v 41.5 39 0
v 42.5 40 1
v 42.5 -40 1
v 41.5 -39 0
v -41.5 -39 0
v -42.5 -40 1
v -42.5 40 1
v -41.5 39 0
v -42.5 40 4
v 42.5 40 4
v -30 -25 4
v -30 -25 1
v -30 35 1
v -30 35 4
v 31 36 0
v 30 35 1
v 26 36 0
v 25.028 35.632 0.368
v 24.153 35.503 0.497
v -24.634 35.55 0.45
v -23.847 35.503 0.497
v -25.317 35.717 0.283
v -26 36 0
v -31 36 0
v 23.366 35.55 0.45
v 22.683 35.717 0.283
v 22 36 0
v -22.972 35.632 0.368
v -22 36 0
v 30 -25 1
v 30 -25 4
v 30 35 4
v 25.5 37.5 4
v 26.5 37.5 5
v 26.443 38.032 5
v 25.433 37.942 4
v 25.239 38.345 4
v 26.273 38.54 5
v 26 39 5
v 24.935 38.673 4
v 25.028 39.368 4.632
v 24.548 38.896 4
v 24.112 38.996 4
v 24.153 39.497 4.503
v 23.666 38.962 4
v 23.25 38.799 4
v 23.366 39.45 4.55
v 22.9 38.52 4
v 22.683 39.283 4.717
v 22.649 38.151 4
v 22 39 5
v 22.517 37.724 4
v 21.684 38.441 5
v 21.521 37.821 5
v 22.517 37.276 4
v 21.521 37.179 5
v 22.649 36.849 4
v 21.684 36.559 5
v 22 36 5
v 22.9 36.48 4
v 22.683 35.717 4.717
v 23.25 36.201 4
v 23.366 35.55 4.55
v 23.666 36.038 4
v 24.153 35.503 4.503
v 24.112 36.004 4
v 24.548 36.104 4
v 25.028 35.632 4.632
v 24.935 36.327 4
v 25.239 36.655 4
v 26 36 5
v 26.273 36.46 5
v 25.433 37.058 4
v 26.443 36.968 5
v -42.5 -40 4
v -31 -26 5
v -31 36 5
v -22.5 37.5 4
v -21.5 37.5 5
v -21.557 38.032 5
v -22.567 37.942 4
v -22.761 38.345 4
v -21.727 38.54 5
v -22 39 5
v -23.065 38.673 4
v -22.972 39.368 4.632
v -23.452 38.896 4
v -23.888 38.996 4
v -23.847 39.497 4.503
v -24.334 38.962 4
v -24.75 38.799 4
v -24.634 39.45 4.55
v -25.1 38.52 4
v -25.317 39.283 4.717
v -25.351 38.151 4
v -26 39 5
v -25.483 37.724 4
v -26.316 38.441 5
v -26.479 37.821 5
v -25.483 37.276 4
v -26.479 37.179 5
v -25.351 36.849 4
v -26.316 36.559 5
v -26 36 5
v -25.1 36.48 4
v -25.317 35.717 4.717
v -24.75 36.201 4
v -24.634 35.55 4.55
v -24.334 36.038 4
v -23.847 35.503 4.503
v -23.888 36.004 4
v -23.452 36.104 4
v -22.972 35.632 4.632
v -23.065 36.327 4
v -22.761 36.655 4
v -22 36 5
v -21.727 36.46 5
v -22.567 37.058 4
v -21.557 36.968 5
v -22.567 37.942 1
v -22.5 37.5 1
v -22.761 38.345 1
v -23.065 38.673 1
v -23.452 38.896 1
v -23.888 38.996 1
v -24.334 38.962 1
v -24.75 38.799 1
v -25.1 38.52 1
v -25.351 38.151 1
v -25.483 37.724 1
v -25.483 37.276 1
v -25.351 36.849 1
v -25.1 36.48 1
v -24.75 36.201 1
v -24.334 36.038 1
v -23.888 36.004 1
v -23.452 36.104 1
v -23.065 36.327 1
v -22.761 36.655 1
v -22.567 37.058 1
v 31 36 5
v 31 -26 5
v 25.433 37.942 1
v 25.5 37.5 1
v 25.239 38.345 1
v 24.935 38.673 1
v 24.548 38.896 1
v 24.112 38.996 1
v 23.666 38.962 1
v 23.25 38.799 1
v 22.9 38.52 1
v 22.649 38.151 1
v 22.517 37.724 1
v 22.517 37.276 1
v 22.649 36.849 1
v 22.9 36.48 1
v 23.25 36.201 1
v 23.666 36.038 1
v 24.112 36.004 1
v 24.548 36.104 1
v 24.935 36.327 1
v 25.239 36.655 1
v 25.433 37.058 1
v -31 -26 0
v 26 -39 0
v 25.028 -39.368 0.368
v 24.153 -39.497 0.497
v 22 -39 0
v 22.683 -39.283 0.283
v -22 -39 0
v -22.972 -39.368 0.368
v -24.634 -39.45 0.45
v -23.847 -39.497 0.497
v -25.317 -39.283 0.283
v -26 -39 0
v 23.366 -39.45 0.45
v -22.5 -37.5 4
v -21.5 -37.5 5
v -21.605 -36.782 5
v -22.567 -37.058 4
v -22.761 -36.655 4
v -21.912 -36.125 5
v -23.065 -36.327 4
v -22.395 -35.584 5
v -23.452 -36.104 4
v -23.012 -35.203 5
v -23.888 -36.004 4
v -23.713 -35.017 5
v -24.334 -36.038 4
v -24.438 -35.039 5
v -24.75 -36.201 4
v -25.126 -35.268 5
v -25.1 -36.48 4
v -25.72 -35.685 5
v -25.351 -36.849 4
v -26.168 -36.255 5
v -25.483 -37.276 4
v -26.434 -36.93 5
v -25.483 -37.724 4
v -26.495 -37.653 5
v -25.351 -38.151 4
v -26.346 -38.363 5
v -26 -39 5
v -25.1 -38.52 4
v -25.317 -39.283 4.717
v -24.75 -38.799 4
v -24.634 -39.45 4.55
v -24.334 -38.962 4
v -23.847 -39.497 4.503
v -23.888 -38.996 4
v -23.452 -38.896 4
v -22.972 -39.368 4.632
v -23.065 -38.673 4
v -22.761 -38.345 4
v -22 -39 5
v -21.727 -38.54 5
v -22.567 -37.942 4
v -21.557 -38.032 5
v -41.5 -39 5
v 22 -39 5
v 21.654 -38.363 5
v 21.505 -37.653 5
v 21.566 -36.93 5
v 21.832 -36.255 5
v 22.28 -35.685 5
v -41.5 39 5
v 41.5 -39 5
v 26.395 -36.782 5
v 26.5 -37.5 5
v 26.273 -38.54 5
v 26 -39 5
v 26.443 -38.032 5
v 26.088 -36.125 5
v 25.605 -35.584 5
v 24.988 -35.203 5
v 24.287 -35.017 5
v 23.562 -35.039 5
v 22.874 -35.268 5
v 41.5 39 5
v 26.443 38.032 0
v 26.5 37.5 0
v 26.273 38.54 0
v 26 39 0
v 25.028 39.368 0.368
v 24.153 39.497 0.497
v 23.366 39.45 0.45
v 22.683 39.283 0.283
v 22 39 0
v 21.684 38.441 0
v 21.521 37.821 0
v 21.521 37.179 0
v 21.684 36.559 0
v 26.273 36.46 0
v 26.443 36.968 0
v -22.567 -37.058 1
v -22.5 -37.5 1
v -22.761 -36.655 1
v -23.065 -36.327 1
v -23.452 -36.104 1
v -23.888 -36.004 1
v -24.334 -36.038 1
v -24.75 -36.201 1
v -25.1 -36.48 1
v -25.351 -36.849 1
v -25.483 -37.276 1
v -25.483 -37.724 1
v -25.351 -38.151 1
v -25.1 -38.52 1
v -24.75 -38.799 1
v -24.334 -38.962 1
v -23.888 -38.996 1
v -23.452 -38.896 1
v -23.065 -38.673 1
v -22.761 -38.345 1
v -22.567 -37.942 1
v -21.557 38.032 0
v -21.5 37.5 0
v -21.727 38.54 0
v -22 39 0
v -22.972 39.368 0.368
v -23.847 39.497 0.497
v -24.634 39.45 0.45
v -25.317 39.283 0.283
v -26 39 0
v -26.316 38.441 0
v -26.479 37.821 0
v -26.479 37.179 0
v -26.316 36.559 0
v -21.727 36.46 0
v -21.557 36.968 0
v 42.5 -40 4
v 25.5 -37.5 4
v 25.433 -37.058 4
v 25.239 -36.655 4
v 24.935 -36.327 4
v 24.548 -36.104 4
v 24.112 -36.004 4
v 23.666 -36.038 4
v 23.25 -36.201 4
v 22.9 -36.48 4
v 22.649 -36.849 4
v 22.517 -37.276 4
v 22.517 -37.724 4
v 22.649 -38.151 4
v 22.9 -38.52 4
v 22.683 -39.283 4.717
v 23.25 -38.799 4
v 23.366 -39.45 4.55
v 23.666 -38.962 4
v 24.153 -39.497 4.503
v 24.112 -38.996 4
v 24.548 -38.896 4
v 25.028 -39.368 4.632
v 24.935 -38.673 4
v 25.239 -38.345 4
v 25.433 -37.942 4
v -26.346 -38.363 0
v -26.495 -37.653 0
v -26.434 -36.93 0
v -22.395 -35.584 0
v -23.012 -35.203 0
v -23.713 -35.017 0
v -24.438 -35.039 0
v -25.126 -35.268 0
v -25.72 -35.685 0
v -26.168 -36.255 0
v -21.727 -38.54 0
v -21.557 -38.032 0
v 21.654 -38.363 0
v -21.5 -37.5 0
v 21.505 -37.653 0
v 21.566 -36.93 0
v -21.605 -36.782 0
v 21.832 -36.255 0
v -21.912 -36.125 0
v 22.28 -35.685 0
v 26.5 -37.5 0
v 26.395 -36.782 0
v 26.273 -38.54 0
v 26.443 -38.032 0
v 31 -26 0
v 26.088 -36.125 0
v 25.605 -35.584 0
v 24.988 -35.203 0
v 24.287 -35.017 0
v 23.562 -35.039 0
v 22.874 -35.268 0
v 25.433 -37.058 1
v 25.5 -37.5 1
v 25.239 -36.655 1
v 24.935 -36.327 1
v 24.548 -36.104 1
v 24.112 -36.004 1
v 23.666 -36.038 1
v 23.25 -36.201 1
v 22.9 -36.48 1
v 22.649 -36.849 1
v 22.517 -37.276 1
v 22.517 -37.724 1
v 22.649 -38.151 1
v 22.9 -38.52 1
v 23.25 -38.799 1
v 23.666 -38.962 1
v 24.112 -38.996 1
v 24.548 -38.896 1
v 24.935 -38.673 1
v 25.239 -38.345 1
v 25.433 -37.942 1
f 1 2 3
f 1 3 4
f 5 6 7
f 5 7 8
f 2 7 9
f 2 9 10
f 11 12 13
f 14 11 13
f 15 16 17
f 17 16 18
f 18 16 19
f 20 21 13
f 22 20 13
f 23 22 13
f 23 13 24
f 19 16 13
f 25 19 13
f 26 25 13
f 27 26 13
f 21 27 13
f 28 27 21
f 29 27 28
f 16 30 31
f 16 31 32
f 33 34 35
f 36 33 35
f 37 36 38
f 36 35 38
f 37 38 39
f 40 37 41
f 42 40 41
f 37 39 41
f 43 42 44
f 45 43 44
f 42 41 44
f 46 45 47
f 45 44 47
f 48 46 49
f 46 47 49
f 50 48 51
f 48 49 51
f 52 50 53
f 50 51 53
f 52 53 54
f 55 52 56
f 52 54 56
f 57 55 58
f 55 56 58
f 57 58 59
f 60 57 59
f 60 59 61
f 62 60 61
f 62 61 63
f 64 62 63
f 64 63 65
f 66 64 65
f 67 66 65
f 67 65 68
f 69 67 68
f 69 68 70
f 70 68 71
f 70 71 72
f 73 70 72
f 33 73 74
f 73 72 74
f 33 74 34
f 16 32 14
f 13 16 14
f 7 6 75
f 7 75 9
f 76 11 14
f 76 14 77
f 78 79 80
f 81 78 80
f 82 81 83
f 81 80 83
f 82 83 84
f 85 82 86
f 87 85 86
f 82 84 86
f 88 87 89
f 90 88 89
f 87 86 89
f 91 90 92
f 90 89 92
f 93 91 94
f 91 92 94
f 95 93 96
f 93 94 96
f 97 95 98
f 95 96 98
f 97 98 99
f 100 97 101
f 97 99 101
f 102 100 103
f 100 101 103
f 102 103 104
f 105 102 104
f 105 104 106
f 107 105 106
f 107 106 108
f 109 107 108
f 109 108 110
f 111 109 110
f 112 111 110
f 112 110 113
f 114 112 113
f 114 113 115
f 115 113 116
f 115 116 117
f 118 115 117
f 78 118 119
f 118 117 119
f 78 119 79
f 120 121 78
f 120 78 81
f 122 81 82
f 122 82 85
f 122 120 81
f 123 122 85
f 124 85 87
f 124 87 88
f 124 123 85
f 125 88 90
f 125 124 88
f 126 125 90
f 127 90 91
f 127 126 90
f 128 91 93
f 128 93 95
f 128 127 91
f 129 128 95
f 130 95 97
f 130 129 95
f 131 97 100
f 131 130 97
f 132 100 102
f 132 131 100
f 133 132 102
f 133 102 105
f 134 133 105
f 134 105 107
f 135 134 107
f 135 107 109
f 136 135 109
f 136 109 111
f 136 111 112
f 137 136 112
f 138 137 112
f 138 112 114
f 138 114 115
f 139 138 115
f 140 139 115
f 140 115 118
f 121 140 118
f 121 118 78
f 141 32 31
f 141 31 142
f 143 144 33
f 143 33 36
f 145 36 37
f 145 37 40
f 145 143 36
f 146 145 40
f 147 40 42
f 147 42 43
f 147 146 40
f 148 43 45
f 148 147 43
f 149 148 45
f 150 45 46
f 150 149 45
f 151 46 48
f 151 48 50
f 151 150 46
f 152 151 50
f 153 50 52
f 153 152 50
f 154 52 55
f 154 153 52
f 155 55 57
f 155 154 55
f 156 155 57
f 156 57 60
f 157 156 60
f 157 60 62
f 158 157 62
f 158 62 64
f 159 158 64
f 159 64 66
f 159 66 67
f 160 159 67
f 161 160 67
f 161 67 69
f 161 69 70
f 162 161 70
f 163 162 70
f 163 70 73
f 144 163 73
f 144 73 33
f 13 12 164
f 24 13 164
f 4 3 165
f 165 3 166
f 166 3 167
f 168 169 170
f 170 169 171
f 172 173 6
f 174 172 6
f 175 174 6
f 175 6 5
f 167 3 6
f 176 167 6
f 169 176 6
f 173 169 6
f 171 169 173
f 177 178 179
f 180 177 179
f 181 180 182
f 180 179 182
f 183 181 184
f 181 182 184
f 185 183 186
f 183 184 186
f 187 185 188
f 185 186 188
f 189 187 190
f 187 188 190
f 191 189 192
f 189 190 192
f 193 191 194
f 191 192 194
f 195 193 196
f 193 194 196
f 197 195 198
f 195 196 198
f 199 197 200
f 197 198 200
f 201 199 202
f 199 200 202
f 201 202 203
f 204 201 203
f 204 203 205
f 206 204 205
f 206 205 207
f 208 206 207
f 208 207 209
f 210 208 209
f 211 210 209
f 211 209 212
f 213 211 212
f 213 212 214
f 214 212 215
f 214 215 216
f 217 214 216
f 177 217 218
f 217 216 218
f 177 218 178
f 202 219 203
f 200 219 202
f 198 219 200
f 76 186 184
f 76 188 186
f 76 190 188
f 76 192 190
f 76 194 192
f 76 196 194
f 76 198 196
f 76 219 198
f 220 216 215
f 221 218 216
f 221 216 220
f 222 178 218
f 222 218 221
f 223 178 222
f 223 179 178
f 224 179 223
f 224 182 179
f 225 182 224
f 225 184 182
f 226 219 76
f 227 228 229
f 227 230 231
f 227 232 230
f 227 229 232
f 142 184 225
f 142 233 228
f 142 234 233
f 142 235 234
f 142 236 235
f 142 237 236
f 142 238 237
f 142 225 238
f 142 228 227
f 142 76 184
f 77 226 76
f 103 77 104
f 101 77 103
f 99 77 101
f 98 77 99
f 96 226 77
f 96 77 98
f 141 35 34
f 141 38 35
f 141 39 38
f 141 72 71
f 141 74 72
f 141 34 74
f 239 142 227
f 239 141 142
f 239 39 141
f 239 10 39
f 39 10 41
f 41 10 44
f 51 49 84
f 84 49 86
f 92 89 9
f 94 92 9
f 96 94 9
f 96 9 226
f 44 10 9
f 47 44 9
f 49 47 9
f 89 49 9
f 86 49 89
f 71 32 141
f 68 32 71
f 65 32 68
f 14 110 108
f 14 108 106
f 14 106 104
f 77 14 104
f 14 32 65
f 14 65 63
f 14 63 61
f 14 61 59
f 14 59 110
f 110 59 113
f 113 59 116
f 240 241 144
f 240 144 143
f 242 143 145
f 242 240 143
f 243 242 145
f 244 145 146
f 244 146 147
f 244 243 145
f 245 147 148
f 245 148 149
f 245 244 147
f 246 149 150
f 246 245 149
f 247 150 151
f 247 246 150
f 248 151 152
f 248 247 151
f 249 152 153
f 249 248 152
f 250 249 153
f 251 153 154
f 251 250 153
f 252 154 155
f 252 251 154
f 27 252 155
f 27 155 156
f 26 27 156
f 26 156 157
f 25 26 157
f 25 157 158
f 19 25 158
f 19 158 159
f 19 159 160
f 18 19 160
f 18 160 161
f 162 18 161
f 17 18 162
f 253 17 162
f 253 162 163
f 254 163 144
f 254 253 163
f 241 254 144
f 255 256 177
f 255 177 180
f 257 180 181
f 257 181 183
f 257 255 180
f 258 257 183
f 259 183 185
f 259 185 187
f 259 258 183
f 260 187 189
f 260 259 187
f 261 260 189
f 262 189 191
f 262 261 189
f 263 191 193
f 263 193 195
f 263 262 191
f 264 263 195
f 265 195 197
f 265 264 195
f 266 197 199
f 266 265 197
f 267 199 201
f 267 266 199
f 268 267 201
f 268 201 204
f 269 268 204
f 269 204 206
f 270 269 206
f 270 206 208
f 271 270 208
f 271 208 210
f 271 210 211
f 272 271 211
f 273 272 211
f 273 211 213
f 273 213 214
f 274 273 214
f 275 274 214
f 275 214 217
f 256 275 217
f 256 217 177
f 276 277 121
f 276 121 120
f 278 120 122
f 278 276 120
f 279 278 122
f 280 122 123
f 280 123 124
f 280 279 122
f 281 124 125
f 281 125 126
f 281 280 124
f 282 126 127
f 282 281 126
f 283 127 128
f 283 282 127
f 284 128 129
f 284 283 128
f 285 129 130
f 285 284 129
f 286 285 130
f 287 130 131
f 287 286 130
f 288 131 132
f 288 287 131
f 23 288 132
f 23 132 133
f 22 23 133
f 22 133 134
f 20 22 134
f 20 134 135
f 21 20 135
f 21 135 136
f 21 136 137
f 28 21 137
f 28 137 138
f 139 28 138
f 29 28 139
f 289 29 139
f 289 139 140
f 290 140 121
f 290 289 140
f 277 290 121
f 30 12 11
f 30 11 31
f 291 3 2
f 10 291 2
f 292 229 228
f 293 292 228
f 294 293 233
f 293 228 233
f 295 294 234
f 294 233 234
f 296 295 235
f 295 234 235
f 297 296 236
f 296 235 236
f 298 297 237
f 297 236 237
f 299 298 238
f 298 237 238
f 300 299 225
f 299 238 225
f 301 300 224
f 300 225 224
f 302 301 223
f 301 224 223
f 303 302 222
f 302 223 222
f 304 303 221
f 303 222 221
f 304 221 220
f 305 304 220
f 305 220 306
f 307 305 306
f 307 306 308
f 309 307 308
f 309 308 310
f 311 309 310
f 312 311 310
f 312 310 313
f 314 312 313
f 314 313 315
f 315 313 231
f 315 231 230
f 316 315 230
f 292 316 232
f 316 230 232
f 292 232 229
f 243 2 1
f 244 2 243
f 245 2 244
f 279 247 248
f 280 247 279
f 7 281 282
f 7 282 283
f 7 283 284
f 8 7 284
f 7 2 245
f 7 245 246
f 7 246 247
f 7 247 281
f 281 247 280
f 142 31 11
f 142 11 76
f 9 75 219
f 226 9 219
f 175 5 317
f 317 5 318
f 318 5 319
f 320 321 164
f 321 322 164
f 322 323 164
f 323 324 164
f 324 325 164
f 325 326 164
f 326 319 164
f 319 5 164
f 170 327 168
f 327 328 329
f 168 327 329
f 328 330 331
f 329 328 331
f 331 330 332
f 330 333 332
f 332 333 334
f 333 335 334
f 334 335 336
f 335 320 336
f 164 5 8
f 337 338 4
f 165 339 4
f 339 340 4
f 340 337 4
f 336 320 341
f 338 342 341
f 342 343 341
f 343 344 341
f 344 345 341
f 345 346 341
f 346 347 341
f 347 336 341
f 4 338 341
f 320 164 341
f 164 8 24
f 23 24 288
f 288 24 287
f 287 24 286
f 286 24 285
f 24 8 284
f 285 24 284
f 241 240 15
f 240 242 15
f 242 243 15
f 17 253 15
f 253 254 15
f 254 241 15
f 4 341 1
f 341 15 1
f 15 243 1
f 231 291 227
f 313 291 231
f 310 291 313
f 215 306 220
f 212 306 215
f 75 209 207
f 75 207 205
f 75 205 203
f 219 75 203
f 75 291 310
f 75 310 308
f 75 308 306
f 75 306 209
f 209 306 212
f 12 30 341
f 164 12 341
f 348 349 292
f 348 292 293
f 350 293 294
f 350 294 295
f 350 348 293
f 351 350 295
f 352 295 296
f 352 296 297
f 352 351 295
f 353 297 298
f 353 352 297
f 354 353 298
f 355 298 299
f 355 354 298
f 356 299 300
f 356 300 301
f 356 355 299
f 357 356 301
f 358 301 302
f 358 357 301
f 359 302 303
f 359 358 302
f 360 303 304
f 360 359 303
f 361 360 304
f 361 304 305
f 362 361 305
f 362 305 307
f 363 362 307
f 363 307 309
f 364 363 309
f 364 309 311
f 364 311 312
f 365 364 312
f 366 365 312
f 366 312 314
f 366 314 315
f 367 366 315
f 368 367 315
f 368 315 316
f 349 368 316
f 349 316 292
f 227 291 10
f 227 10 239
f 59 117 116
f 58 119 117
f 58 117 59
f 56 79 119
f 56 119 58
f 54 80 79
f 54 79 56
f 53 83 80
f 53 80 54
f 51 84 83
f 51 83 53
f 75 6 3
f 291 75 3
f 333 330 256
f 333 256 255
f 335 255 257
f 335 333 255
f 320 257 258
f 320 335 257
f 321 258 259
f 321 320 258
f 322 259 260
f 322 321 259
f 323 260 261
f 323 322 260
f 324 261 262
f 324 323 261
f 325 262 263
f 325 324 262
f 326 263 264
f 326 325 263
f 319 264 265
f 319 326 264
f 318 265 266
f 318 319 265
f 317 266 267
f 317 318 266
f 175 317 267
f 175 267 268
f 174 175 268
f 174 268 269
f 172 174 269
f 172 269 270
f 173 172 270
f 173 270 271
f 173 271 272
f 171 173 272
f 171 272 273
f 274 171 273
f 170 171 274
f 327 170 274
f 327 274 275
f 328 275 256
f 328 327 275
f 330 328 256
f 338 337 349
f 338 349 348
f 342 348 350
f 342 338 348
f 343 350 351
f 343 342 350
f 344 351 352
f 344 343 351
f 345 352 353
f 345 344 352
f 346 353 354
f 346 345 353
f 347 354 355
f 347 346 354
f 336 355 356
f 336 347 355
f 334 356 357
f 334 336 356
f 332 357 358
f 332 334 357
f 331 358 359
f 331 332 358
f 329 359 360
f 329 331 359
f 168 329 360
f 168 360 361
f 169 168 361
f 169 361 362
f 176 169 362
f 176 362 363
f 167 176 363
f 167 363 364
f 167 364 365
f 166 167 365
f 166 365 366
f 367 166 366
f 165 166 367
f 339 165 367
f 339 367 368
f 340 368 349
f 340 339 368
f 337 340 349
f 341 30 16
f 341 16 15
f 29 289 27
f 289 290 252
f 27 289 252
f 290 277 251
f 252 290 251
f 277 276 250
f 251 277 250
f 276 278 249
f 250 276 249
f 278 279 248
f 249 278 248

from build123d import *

# Parameters (mm, degrees)
F0_W          = 85
F0_H          = 80
F0_R          = 1.5
F0_W_2        = 60
F0_H_2        = 60
F1_DEPTH      = 5
F2_T1_DEPTH   = 90.1433659759
F2_T3_DEPTH   = 85.1433659759
F2_T5_DEPTH   = 60
F2_T7_DEPTH   = 60
F2_T29_DEPTH  = 62.571682988
F2_T33_DEPTH  = 62.571682988
F2_T40_DEPTH  = 62.571682988
F2_T44_DEPTH  = 62.571682988
F2_T51_DEPTH  = 62.571682988
F2_T55_DEPTH  = 62.571682988
F2_T62_DEPTH  = 62.571682988
F2_T66_DEPTH  = 62.571682988
F2_T73_DEPTH  = 62.571682988
F2_T77_DEPTH  = 62.571682988
F2_T84_DEPTH  = 62.571682988
F2_T88_DEPTH  = 62.571682988
F2_T95_DEPTH  = 62.571682988
F2_T99_DEPTH  = 62.571682988
F2_T106_DEPTH = 62.571682988
F2_T110_DEPTH = 62.571682988


# Not quite as in the source:
# - a fillet or chamfer that OpenCascade refuses, or shapes differently, is made with other operations: its cross-section is extruded or revolved along the edge and cut away or added


with BuildPart() as f1:
    # F0 (on Top) → F1 (new body)
    with BuildSketch(Plane.XY):
        Rectangle(F0_W, F0_H)
        with Locations((-24, -37.5)):
            Circle(F0_R, mode=Mode.SUBTRACT)
        with Locations((24, -37.5)):
            Circle(F0_R, mode=Mode.SUBTRACT)
        with Locations((-24, 37.5)):
            Circle(F0_R, mode=Mode.SUBTRACT)
        with Locations((0, 5)):
            Rectangle(F0_W_2, F0_H_2, mode=Mode.SUBTRACT)
        with Locations((24, 37.5)):
            Circle(F0_R, mode=Mode.SUBTRACT)
    extrude(amount=F1_DEPTH)

    # F2: chamfer of 1 on 24 edges, made by hand

    # F2_s2 → F2_t1 (cut)
    with BuildSketch(Plane.YZ.offset(-45.071682988)):
        Polygon((40, 4), (39, 5), (40, 5), align=None)
        Polygon((-40, 4), (-39, 5), (-40, 5), align=None)
        Polygon((40, 1), (39, 0), (40, 0), align=None)
        Polygon((-40, 1), (-39, 0), (-40, 0), align=None)
    extrude(amount=F2_T1_DEPTH, mode=Mode.SUBTRACT)

    # F2_s4 → F2_t3 (cut)
    with BuildSketch(Plane.XZ.offset(-42.571682988)):
        Polygon((-42.5, 4), (-41.5, 5), (-42.5, 5), align=None)
        Polygon((42.5, 4), (41.5, 5), (42.5, 5), align=None)
        Polygon((-42.5, 1), (-41.5, 0), (-42.5, 0), align=None)
        Polygon((42.5, 1), (41.5, 0), (42.5, 0), align=None)
    extrude(amount=F2_T3_DEPTH, mode=Mode.SUBTRACT)

    # F2_s6 → F2_t5 (cut)
    with BuildSketch(Plane.XZ.offset(-35)):
        Polygon((-30, 4), (-31, 5), (-30, 5), align=None)
        Polygon((30, 4), (31, 5), (30, 5), align=None)
        Polygon((-30, 1), (-31, 0), (-30, 0), align=None)
        Polygon((30, 1), (31, 0), (30, 0), align=None)
    extrude(amount=F2_T5_DEPTH, mode=Mode.SUBTRACT)

    # F2_s8 → F2_t7 (cut)
    with BuildSketch(Plane.YZ.offset(-30)):
        Polygon((35, 4), (36, 5), (35, 5), align=None)
        Polygon((-25, 4), (-26, 5), (-25, 5), align=None)
        Polygon((35, 1), (36, 0), (35, 0), align=None)
        Polygon((-25, 1), (-26, 0), (-25, 0), align=None)
    extrude(amount=F2_T7_DEPTH, mode=Mode.SUBTRACT)

    # F2_s9 → F2_t10 (revolve, cut)
    with BuildSketch(Plane.XZ.offset(37.5)):
        Polygon((-22.5, 4), (-21.5, 5), (-22.5, 5), align=None)
    revolve(axis=Axis((-24, -37.5, 5), (0, 0, 1)), mode=Mode.SUBTRACT)

    # F2_s11 → F2_t12 (revolve, cut)
    with BuildSketch(Plane.XZ.offset(37.5)):
        Polygon((25.5, 4), (26.5, 5), (25.5, 5), align=None)
    revolve(axis=Axis((24, -37.5, 5), (0, 0, 1)), mode=Mode.SUBTRACT)

    # F2_s13 → F2_t14 (revolve, cut)
    with BuildSketch(Plane.XZ.offset(-37.5)):
        Polygon((-22.5, 4), (-21.5, 5), (-22.5, 5), align=None)
    revolve(axis=Axis((-24, 37.5, 5), (0, 0, 1)), mode=Mode.SUBTRACT)

    # F2_s15 → F2_t16 (revolve, cut)
    with BuildSketch(Plane.XZ.offset(-37.5)):
        Polygon((25.5, 4), (26.5, 5), (25.5, 5), align=None)
    revolve(axis=Axis((24, 37.5, 5), (0, 0, 1)), mode=Mode.SUBTRACT)

    # F2_s17 → F2_t18 (revolve, cut)
    with BuildSketch(Plane.XZ.offset(37.5)):
        Polygon((-22.5, 1), (-21.5, 0), (-22.5, 0), align=None)
    revolve(axis=Axis((-24, -37.5, 0), (0, 0, 1)), mode=Mode.SUBTRACT)

    # F2_s19 → F2_t20 (revolve, cut)
    with BuildSketch(Plane.XZ.offset(37.5)):
        Polygon((25.5, 1), (26.5, 0), (25.5, 0), align=None)
    revolve(axis=Axis((24, -37.5, 0), (0, 0, 1)), mode=Mode.SUBTRACT)

    # F2_s21 → F2_t22 (revolve, cut)
    with BuildSketch(Plane.XZ.offset(-37.5)):
        Polygon((-22.5, 1), (-21.5, 0), (-22.5, 0), align=None)
    revolve(axis=Axis((-24, 37.5, 0), (0, 0, 1)), mode=Mode.SUBTRACT)

    # F2_s23 → F2_t24 (revolve, cut)
    with BuildSketch(Plane.XZ.offset(-37.5)):
        Polygon((25.5, 1), (26.5, 0), (25.5, 0), align=None)
    revolve(axis=Axis((24, 37.5, 0), (0, 0, 1)), mode=Mode.SUBTRACT)


with BuildPart() as f2_tool27:
    # F2_s28 → F2_t29 (new body)
    with BuildSketch(Plane.XZ.offset(27.571682988)):
        Polygon((-30, 4), (-31, 5), (-30, 5), align=None)
    extrude(amount=-F2_T29_DEPTH)

    split(bisect_by=Plane.XZ.offset(25), keep=Keep.TOP)


with BuildPart() as f2_tool31:
    # F2_s32 → F2_t33 (new body)
    with BuildSketch(Plane.YZ.offset(30)):
        Polygon((-25, 4), (-26, 5), (-25, 5), align=None)
    extrude(amount=-F2_T33_DEPTH)

    split(bisect_by=Plane.YZ.offset(-30), keep=Keep.BOTTOM)


with BuildPart() as f2_tool27_1:
    add(f2_tool27.part)

    # F2_t35: intersect F2_tool31
    add(f2_tool31.part, mode=Mode.INTERSECT)


with BuildPart() as f1_1:
    add(f1.part)

    # F2_t25: cut F2_tool27
    add(f2_tool27_1.part, mode=Mode.SUBTRACT)


with BuildPart() as f2_tool38:
    # F2_s39 → F2_t40 (new body)
    with BuildSketch(Plane.XZ.offset(25)):
        Polygon((-30, 4), (-31, 5), (-30, 5), align=None)
    extrude(amount=-F2_T40_DEPTH)

    split(bisect_by=Plane.XZ.offset(-35), keep=Keep.BOTTOM)


with BuildPart() as f2_tool42:
    # F2_s43 → F2_t44 (new body)
    with BuildSketch(Plane.YZ.offset(-32.571682988)):
        Polygon((35, 4), (36, 5), (35, 5), align=None)
    extrude(amount=F2_T44_DEPTH)

    split(bisect_by=Plane.YZ.offset(-30), keep=Keep.BOTTOM)


with BuildPart() as f2_tool38_1:
    add(f2_tool38.part)

    # F2_t46: intersect F2_tool42
    add(f2_tool42.part, mode=Mode.INTERSECT)


with BuildPart() as f1_2:
    add(f1_1.part)

    # F2_t36: cut F2_tool38
    add(f2_tool38_1.part, mode=Mode.SUBTRACT)


with BuildPart() as f2_tool49:
    # F2_s50 → F2_t51 (new body)
    with BuildSketch(Plane.YZ.offset(-30)):
        Polygon((35, 4), (36, 5), (35, 5), align=None)
    extrude(amount=F2_T51_DEPTH)

    split(bisect_by=Plane.YZ.offset(30), keep=Keep.TOP)


with BuildPart() as f2_tool53:
    # F2_s54 → F2_t55 (new body)
    with BuildSketch(Plane.XZ.offset(-37.571682988)):
        Polygon((30, 4), (31, 5), (30, 5), align=None)
    extrude(amount=F2_T55_DEPTH)

    split(bisect_by=Plane.XZ.offset(-35), keep=Keep.BOTTOM)


with BuildPart() as f2_tool49_1:
    add(f2_tool49.part)

    # F2_t57: intersect F2_tool53
    add(f2_tool53.part, mode=Mode.INTERSECT)


with BuildPart() as f1_3:
    add(f1_2.part)

    # F2_t47: cut F2_tool49
    add(f2_tool49_1.part, mode=Mode.SUBTRACT)


with BuildPart() as f2_tool60:
    # F2_s61 → F2_t62 (new body)
    with BuildSketch(Plane.XZ.offset(-35)):
        Polygon((30, 4), (31, 5), (30, 5), align=None)
    extrude(amount=F2_T62_DEPTH)

    split(bisect_by=Plane.XZ.offset(25), keep=Keep.TOP)


with BuildPart() as f2_tool64:
    # F2_s65 → F2_t66 (new body)
    with BuildSketch(Plane.YZ.offset(32.571682988)):
        Polygon((-25, 4), (-26, 5), (-25, 5), align=None)
    extrude(amount=-F2_T66_DEPTH)

    split(bisect_by=Plane.YZ.offset(30), keep=Keep.TOP)


with BuildPart() as f2_tool60_1:
    add(f2_tool60.part)

    # F2_t68: intersect F2_tool64
    add(f2_tool64.part, mode=Mode.INTERSECT)


with BuildPart() as f1_4:
    add(f1_3.part)

    # F2_t58: cut F2_tool60
    add(f2_tool60_1.part, mode=Mode.SUBTRACT)


with BuildPart() as f2_tool71:
    # F2_s72 → F2_t73 (new body)
    with BuildSketch(Plane.XZ.offset(27.571682988)):
        Polygon((-30, 1), (-31, 0), (-30, 0), align=None)
    extrude(amount=-F2_T73_DEPTH)

    split(bisect_by=Plane.XZ.offset(25), keep=Keep.TOP)


with BuildPart() as f2_tool75:
    # F2_s76 → F2_t77 (new body)
    with BuildSketch(Plane.YZ.offset(30)):
        Polygon((-25, 1), (-26, 0), (-25, 0), align=None)
    extrude(amount=-F2_T77_DEPTH)

    split(bisect_by=Plane.YZ.offset(-30), keep=Keep.BOTTOM)


with BuildPart() as f2_tool71_1:
    add(f2_tool71.part)

    # F2_t79: intersect F2_tool75
    add(f2_tool75.part, mode=Mode.INTERSECT)


with BuildPart() as f1_5:
    add(f1_4.part)

    # F2_t69: cut F2_tool71
    add(f2_tool71_1.part, mode=Mode.SUBTRACT)


with BuildPart() as f2_tool82:
    # F2_s83 → F2_t84 (new body)
    with BuildSketch(Plane.XZ.offset(25)):
        Polygon((-30, 1), (-31, 0), (-30, 0), align=None)
    extrude(amount=-F2_T84_DEPTH)

    split(bisect_by=Plane.XZ.offset(-35), keep=Keep.BOTTOM)


with BuildPart() as f2_tool86:
    # F2_s87 → F2_t88 (new body)
    with BuildSketch(Plane.YZ.offset(-32.571682988)):
        Polygon((35, 1), (36, 0), (35, 0), align=None)
    extrude(amount=F2_T88_DEPTH)

    split(bisect_by=Plane.YZ.offset(-30), keep=Keep.BOTTOM)


with BuildPart() as f2_tool82_1:
    add(f2_tool82.part)

    # F2_t90: intersect F2_tool86
    add(f2_tool86.part, mode=Mode.INTERSECT)


with BuildPart() as f1_6:
    add(f1_5.part)

    # F2_t80: cut F2_tool82
    add(f2_tool82_1.part, mode=Mode.SUBTRACT)


with BuildPart() as f2_tool93:
    # F2_s94 → F2_t95 (new body)
    with BuildSketch(Plane.YZ.offset(-30)):
        Polygon((35, 1), (36, 0), (35, 0), align=None)
    extrude(amount=F2_T95_DEPTH)

    split(bisect_by=Plane.YZ.offset(30), keep=Keep.TOP)


with BuildPart() as f2_tool97:
    # F2_s98 → F2_t99 (new body)
    with BuildSketch(Plane.XZ.offset(-37.571682988)):
        Polygon((30, 1), (31, 0), (30, 0), align=None)
    extrude(amount=F2_T99_DEPTH)

    split(bisect_by=Plane.XZ.offset(-35), keep=Keep.BOTTOM)


with BuildPart() as f2_tool93_1:
    add(f2_tool93.part)

    # F2_t101: intersect F2_tool97
    add(f2_tool97.part, mode=Mode.INTERSECT)


with BuildPart() as f1_7:
    add(f1_6.part)

    # F2_t91: cut F2_tool93
    add(f2_tool93_1.part, mode=Mode.SUBTRACT)


with BuildPart() as f2_tool104:
    # F2_s105 → F2_t106 (new body)
    with BuildSketch(Plane.XZ.offset(-35)):
        Polygon((30, 1), (31, 0), (30, 0), align=None)
    extrude(amount=F2_T106_DEPTH)

    split(bisect_by=Plane.XZ.offset(25), keep=Keep.TOP)


with BuildPart() as f2_tool108:
    # F2_s109 → F2_t110 (new body)
    with BuildSketch(Plane.YZ.offset(32.571682988)):
        Polygon((-25, 1), (-26, 0), (-25, 0), align=None)
    extrude(amount=-F2_T110_DEPTH)

    split(bisect_by=Plane.YZ.offset(30), keep=Keep.TOP)


with BuildPart() as f2_tool104_1:
    add(f2_tool104.part)

    # F2_t112: intersect F2_tool108
    add(f2_tool108.part, mode=Mode.INTERSECT)


with BuildPart() as f1_8:
    add(f1_7.part)

    # F2_t102: cut F2_tool104
    add(f2_tool104_1.part, mode=Mode.SUBTRACT)


solid = f1_8.part
